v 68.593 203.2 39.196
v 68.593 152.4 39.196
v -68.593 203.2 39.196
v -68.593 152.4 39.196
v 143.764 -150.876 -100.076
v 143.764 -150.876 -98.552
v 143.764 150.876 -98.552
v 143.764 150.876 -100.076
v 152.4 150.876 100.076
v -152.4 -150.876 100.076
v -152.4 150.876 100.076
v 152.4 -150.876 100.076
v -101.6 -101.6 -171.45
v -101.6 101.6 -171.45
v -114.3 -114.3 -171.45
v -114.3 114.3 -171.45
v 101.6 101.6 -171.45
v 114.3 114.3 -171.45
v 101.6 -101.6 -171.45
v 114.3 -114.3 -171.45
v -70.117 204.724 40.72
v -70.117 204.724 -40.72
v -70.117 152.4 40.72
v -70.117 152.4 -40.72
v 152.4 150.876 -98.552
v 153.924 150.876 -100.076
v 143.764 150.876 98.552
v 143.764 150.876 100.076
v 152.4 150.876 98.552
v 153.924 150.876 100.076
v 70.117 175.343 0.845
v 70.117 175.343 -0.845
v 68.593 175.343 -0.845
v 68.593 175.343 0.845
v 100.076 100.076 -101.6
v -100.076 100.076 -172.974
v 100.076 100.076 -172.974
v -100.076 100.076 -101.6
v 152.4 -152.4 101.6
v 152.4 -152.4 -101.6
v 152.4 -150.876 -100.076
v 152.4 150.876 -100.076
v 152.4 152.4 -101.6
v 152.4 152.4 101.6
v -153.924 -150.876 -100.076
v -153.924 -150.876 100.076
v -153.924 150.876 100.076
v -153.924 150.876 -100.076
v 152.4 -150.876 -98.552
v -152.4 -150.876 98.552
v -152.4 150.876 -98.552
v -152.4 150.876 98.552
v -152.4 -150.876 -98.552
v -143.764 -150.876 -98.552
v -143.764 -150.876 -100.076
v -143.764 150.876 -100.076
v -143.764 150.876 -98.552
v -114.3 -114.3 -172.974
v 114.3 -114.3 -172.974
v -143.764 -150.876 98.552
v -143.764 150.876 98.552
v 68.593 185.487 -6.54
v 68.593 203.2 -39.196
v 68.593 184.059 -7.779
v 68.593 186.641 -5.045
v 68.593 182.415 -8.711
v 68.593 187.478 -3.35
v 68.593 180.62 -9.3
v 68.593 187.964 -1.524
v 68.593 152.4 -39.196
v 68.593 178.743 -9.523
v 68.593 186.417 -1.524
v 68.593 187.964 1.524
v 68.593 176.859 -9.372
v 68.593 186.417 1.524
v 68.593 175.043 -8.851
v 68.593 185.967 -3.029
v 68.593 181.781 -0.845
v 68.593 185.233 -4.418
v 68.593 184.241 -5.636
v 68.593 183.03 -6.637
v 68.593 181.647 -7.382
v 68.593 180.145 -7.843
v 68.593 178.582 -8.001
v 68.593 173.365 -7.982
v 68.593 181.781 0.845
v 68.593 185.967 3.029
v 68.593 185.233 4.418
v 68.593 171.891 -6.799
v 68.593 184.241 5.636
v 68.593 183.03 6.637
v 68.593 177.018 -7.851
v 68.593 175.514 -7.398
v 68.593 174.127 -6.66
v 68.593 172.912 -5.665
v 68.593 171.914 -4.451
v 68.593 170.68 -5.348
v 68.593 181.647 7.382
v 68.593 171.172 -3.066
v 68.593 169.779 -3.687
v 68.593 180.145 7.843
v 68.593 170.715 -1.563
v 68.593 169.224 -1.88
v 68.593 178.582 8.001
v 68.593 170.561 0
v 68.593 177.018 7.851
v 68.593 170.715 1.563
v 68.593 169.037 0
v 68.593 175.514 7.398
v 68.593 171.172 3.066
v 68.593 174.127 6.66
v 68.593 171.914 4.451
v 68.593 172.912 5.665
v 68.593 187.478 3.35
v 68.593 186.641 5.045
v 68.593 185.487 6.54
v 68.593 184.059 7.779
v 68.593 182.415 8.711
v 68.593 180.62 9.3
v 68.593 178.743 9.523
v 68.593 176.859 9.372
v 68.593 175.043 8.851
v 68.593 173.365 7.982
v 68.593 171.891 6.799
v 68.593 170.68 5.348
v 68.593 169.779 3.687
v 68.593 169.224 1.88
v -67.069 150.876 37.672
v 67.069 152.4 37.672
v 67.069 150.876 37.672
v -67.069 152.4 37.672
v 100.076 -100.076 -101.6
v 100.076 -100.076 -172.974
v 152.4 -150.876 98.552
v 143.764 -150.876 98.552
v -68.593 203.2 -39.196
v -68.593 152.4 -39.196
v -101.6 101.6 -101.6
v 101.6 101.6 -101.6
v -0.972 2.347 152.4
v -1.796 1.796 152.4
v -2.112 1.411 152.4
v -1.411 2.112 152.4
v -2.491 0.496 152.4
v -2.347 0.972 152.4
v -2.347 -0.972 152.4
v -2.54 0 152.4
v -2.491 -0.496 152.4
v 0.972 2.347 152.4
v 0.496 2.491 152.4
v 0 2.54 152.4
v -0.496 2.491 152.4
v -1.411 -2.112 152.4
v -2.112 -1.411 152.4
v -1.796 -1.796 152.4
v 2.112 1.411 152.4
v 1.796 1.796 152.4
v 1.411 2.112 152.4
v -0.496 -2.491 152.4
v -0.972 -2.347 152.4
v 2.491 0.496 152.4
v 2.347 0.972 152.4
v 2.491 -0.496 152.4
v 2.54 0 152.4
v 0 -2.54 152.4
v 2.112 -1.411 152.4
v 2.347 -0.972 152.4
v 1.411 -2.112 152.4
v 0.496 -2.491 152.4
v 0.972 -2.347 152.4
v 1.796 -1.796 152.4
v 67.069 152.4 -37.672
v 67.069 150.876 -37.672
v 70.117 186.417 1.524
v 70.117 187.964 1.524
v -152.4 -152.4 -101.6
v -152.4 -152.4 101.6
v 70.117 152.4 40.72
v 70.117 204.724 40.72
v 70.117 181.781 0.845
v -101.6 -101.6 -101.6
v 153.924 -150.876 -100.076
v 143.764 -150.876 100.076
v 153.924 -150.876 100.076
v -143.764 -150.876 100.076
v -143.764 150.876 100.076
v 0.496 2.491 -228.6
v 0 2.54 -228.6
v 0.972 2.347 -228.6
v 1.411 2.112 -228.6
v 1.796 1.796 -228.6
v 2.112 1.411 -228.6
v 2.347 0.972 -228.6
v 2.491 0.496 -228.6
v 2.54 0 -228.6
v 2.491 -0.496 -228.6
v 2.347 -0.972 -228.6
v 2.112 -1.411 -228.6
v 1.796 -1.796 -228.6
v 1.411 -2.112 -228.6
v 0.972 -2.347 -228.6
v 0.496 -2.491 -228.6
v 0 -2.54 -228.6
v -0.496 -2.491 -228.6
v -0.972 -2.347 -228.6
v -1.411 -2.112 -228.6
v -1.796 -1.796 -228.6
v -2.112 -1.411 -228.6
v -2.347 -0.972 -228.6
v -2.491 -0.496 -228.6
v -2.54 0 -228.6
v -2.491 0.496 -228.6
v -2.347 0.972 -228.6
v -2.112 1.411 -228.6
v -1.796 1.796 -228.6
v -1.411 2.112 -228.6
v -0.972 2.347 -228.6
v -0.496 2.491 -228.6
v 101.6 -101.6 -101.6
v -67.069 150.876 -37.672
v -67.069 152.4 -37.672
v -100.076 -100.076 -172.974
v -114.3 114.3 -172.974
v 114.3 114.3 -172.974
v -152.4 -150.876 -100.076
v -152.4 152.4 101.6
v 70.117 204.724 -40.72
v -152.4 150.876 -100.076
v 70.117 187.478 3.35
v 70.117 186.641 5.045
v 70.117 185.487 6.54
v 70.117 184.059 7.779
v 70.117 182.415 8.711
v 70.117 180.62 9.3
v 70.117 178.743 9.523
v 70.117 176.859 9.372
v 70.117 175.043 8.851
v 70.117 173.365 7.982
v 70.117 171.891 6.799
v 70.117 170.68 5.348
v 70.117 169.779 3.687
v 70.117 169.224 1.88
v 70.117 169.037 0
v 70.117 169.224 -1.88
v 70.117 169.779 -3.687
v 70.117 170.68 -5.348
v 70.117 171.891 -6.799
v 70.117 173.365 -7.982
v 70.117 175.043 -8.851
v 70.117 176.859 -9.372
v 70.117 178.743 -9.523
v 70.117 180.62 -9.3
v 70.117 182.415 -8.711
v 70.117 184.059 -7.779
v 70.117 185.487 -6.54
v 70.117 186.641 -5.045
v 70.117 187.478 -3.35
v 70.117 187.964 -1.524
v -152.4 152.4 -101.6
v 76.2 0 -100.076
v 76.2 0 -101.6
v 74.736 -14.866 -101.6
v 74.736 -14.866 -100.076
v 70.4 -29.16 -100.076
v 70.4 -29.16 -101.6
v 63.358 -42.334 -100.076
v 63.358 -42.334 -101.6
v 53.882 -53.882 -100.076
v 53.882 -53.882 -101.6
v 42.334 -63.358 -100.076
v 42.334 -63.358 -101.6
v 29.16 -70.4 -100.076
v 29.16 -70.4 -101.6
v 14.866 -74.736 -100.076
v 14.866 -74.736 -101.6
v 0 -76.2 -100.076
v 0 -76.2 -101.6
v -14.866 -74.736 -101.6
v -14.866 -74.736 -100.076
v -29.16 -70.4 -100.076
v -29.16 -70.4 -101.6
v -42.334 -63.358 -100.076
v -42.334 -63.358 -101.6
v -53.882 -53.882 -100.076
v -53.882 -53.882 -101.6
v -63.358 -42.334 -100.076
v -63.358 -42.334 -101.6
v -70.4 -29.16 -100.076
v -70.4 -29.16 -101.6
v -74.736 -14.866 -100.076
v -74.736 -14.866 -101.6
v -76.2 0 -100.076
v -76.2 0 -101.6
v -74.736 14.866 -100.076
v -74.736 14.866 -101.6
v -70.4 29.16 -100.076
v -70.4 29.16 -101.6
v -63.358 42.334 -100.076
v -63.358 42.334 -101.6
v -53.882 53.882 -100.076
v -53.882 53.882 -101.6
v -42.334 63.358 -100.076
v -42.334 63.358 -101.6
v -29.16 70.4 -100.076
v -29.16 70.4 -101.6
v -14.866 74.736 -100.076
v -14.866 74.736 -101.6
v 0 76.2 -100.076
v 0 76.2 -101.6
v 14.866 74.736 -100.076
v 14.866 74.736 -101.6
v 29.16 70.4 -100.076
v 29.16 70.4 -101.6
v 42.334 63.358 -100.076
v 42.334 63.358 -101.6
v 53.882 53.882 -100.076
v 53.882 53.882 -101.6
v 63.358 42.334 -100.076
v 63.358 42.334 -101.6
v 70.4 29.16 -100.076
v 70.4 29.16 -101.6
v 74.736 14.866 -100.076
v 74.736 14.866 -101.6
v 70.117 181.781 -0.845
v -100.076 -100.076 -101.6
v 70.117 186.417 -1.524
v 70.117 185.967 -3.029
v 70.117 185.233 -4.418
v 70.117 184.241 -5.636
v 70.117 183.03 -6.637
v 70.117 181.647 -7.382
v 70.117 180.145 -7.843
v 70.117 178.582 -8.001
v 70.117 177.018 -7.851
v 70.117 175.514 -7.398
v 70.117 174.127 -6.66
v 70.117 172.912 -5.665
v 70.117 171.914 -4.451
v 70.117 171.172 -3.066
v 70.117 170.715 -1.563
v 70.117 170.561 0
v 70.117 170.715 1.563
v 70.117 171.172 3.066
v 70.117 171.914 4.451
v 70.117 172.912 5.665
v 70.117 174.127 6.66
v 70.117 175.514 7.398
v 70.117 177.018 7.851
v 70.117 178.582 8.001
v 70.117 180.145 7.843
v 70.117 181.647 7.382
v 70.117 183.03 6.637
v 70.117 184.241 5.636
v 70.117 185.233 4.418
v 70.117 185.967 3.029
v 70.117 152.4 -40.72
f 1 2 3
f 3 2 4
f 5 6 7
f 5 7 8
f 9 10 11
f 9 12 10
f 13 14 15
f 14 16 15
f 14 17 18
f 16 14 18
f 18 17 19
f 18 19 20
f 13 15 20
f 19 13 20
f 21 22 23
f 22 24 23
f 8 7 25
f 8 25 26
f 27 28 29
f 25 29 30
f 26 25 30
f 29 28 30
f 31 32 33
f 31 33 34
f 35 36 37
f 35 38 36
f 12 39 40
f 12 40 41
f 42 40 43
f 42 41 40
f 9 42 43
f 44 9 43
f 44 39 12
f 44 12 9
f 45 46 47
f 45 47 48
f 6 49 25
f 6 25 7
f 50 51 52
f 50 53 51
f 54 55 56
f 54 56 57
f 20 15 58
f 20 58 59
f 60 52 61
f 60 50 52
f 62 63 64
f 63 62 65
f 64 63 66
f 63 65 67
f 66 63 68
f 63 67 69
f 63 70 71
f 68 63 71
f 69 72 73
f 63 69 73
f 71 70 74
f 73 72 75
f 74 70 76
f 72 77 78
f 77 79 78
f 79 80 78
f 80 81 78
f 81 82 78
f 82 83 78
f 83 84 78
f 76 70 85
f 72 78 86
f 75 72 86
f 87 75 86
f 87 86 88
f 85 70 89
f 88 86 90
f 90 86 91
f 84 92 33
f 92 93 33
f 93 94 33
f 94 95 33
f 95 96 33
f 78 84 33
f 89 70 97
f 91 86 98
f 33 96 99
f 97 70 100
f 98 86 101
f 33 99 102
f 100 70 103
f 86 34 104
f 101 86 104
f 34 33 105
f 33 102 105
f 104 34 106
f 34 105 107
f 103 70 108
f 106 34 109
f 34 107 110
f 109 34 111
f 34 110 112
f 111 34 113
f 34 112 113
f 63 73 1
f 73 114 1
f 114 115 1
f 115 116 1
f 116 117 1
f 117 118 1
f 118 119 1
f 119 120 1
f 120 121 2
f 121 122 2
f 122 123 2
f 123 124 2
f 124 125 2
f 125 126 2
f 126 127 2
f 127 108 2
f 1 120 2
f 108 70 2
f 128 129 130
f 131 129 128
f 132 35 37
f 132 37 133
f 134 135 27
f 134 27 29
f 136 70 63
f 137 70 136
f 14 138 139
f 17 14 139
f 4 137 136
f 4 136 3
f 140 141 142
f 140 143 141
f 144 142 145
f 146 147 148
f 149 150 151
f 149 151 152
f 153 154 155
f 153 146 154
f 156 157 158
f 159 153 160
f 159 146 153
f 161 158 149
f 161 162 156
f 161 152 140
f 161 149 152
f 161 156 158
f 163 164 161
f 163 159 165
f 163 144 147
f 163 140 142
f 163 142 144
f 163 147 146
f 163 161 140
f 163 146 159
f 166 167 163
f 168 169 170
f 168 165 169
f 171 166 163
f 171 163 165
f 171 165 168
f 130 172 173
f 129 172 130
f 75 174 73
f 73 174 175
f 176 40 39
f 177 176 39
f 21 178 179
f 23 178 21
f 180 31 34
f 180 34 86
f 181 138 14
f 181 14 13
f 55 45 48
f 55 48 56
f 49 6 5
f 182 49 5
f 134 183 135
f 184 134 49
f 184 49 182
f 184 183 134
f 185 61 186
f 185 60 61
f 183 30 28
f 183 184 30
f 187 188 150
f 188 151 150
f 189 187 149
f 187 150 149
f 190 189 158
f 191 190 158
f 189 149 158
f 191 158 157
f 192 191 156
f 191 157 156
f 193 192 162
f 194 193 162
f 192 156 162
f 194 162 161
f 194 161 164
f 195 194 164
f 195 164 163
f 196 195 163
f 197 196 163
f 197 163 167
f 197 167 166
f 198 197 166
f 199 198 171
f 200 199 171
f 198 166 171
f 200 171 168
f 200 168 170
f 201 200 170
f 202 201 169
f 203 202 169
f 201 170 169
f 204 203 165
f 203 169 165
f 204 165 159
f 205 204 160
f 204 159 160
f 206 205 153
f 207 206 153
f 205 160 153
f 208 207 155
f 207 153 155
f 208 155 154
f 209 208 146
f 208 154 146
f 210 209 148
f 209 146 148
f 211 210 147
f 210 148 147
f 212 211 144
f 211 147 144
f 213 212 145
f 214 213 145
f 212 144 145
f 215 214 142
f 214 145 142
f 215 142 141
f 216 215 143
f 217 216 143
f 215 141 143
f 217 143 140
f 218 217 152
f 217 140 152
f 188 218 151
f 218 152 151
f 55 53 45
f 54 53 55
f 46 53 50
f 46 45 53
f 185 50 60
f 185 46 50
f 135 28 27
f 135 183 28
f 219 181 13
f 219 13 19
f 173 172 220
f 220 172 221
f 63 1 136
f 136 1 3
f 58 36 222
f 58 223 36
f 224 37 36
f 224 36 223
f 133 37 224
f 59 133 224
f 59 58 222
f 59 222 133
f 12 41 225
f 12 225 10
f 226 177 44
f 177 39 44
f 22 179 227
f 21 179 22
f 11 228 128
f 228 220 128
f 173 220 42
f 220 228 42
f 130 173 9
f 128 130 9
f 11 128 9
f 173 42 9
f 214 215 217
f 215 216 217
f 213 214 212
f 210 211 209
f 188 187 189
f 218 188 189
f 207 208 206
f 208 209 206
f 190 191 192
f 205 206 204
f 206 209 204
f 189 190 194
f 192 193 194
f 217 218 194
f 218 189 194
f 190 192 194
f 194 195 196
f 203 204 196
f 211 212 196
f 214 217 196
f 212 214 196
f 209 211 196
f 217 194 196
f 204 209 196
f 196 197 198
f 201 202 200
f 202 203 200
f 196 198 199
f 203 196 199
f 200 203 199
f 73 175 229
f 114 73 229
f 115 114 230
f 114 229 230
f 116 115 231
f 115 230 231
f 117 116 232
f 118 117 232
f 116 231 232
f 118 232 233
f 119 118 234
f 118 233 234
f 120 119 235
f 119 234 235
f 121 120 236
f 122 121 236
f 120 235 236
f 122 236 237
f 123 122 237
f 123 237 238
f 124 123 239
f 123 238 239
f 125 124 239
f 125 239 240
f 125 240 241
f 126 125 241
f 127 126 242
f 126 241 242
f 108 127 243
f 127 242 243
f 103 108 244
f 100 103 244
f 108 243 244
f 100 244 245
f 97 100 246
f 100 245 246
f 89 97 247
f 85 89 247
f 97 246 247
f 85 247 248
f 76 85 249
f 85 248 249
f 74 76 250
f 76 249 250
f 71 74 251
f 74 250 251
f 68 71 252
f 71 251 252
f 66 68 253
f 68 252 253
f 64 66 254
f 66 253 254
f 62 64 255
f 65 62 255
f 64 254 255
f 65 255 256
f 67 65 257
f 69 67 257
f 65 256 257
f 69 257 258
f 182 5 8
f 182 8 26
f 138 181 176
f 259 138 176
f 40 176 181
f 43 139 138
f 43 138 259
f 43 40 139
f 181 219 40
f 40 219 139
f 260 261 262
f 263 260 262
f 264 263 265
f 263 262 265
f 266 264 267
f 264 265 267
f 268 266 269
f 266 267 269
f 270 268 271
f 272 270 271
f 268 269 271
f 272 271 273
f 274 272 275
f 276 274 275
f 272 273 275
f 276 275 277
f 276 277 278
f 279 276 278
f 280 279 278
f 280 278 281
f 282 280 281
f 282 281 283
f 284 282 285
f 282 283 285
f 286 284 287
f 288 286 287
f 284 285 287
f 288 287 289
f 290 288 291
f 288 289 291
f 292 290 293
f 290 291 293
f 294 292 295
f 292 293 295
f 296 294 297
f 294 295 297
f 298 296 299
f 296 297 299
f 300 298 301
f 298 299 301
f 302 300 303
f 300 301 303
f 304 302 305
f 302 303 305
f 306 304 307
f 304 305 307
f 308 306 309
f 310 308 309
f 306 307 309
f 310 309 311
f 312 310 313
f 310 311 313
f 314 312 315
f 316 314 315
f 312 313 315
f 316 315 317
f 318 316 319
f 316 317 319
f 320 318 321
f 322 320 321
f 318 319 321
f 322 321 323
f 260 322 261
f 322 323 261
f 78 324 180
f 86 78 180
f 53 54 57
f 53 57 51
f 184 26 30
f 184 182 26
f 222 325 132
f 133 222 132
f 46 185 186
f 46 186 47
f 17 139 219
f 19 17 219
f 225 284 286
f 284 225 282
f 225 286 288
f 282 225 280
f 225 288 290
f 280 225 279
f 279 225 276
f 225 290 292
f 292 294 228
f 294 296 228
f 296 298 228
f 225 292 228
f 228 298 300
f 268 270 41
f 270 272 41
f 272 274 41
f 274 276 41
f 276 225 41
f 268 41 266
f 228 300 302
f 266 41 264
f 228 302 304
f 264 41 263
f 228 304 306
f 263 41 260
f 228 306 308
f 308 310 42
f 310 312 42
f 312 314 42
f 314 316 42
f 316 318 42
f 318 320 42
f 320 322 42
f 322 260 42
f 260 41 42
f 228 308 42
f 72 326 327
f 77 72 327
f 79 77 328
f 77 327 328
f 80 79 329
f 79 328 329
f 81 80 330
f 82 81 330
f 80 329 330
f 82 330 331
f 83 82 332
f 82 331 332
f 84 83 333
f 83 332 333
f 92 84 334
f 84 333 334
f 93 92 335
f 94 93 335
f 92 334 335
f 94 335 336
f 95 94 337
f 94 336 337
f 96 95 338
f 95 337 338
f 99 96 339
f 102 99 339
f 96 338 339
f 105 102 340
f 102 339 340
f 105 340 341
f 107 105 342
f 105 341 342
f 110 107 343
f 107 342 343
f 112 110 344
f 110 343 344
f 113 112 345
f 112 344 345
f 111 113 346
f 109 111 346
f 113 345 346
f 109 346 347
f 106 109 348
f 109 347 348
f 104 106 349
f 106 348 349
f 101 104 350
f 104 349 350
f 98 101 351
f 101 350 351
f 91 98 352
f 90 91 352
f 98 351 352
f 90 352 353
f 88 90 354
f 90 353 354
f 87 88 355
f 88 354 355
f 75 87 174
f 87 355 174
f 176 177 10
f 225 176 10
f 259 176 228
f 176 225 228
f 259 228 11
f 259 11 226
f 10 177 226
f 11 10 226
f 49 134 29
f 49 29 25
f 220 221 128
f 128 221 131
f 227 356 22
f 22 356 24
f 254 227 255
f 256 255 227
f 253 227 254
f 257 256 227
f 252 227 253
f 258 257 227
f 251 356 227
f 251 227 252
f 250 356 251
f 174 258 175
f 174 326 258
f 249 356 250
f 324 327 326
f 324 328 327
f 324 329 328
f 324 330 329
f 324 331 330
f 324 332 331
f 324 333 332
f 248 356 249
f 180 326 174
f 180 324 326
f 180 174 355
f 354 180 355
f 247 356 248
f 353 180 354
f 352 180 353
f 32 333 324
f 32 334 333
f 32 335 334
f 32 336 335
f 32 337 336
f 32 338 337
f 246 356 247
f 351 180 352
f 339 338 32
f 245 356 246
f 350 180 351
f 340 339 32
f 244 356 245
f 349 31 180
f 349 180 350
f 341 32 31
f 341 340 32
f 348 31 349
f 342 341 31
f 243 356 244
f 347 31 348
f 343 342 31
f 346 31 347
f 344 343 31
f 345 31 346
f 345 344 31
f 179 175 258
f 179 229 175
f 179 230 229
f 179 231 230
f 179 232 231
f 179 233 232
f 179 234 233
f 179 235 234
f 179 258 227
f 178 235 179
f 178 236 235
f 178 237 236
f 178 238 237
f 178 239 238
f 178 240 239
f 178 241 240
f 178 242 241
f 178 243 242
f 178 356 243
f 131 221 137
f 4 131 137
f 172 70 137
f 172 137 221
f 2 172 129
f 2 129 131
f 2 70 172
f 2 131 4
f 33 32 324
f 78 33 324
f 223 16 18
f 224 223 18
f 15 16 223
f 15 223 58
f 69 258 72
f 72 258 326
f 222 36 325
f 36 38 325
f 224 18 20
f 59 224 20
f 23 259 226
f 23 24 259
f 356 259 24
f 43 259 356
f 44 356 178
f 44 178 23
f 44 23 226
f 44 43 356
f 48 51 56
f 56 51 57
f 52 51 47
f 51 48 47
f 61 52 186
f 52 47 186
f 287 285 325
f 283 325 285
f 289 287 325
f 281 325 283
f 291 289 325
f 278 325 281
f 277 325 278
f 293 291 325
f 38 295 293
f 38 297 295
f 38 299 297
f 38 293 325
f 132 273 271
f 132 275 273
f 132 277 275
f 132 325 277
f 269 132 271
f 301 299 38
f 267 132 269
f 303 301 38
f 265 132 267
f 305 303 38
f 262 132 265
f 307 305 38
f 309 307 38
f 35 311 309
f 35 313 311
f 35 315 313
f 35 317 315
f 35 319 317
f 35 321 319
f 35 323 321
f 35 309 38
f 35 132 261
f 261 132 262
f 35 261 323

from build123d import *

# Parameters (mm, degrees)
F0_W      = 304.8
F0_H      = 203.2
F0_W_2    = 301.752
F0_H_2    = 200.152
F1_DEPTH  = 152.4
F3_DEPTH  = 150.876
F4_R      = 76.2
F5_DEPTH  = 1.524
F6_W      = 203.2
F6_H      = 203.2
F6_W_2    = 200.152
F6_H_2    = 200.152
F7_DEPTH  = 69.85
F8_W      = 228.6
F8_H      = 228.6
F8_W_2    = 200.152
F8_H_2    = 200.152
F9_DEPTH  = 1.524
F10_W     = 134.1371834278
F10_H     = 75.3432884812
F11_DEPTH = 1.524
F12_W     = 140.2331834278
F12_H     = 81.4392884812
F12_W_2   = 137.1851834278
F12_H_2   = 78.3912884812
F13_DEPTH = 50.8
F14_W     = 140.2331834278
F14_H     = 81.4392884812
F15_DEPTH = 1.524
F16_W     = 6.4386419525
F16_H     = 1.6890700208
F17_DEPTH = 1.524
F18_W     = 2.54
F18_H     = 381


with BuildPart() as f1:
    # F0 (on Right) → F1 (new body, symmetric)
    with BuildSketch(Plane.YZ):
        Rectangle(F0_W, F0_H)
        Rectangle(F0_W_2, F0_H_2, mode=Mode.SUBTRACT)
    extrude(amount=F1_DEPTH, both=True)

    # F4 (on face) → F5 (cut, through all)
    with BuildSketch(Plane(origin=(0, 0, -101.6), x_dir=(1, 0, 0), z_dir=(0, 0, -1))):
        Circle(F4_R)
    extrude(amount=-F5_DEPTH, mode=Mode.SUBTRACT)

    # F6 (on face) → F7 (join)
    with BuildSketch(Plane(origin=(0, 0, -101.6), x_dir=(1, 0, 0), z_dir=(0, 0, -1))):
        Rectangle(F6_W, F6_H)
        Rectangle(F6_W_2, F6_H_2, mode=Mode.SUBTRACT)
    extrude(amount=F7_DEPTH)

    # F8 (on face) → F9 (join)
    with BuildSketch(Plane(origin=(0, 0, -171.45), x_dir=(1, 0, 0), z_dir=(0, 0, -1))):
        Rectangle(F8_W, F8_H)
        Rectangle(F8_W_2, F8_H_2, mode=Mode.SUBTRACT)
    extrude(amount=F9_DEPTH)

    # F10 (on face) → F11 (cut, through all)
    with BuildSketch(Plane(origin=(0, 152.4, 0), x_dir=(-1, 0, 0), z_dir=(0, 1, 0))):
        Rectangle(F10_W, F10_H)
    extrude(amount=-F11_DEPTH, mode=Mode.SUBTRACT)

    # F12 (on face) → F13 (join)
    with BuildSketch(Plane(origin=(0, 152.4, 0), x_dir=(-1, 0, 0), z_dir=(0, 1, 0))):
        Rectangle(F12_W, F12_H)
        Rectangle(F12_W_2, F12_H_2, mode=Mode.SUBTRACT)
    extrude(amount=F13_DEPTH)

    # F14 (on face) → F15 (join)
    with BuildSketch(Plane(origin=(0, 203.2, 0), x_dir=(-1, 0, 0), z_dir=(0, 1, 0))):
        Rectangle(F14_W, F14_H)
    extrude(amount=F15_DEPTH)

    # F16 (on face) → F17 (cut, through all)
    with BuildSketch(Plane.YZ.offset(70.1165917139)):
        with BuildLine():
            Line((186.4165162168, 1.524), (187.9642895616, 1.524))
            ThreePointArc((187.9642895616, 1.524), (169.037, 0), (187.9642895616, -1.524))
            Line((187.9642895616, -1.524), (186.4165162168, -1.524))
            ThreePointArc((186.4165162168, -1.524), (170.561, 0), (186.4165162168, 1.524))
        make_face()
        with Locations((178.562, 0)):
            Rectangle(F16_W, F16_H)
    extrude(amount=-F17_DEPTH, mode=Mode.SUBTRACT)


with BuildPart() as f3:
    # F2 (on Front) → F3 (new body, symmetric)
    with BuildSketch(Plane.XZ):
        Polygon((-143.764, 98.552), (-143.764, 100.076), (-153.924, 100.076), (-153.924, -100.076), (-143.764, -100.076), (-143.764, -98.552), (-152.4, -98.552), (-152.4, 98.552), align=None)
    extrude(amount=F3_DEPTH, both=True)


with BuildPart() as f3b:
    # F2 (on Front) → F3, piece 2 (new body, symmetric)
    with BuildSketch(Plane.XZ):
        Polygon((143.764, 100.076), (143.764, 98.552), (152.4, 98.552), (152.4, -98.552), (143.764, -98.552), (143.764, -100.076), (153.924, -100.076), (153.924, 100.076), align=None)
    extrude(amount=F3_DEPTH, both=True)


with BuildPart() as f19:
    # F18 (on Right) → F19 (revolve)
    with BuildSketch(Plane.YZ):
        with Locations((1.27, -38.1)):
            Rectangle(F18_W, F18_H)
    revolve(axis=Axis((0, 0, -38.1), (0, 0, -1)))


solid = Compound([f1.part, f3.part, f3b.part, f19.part])
